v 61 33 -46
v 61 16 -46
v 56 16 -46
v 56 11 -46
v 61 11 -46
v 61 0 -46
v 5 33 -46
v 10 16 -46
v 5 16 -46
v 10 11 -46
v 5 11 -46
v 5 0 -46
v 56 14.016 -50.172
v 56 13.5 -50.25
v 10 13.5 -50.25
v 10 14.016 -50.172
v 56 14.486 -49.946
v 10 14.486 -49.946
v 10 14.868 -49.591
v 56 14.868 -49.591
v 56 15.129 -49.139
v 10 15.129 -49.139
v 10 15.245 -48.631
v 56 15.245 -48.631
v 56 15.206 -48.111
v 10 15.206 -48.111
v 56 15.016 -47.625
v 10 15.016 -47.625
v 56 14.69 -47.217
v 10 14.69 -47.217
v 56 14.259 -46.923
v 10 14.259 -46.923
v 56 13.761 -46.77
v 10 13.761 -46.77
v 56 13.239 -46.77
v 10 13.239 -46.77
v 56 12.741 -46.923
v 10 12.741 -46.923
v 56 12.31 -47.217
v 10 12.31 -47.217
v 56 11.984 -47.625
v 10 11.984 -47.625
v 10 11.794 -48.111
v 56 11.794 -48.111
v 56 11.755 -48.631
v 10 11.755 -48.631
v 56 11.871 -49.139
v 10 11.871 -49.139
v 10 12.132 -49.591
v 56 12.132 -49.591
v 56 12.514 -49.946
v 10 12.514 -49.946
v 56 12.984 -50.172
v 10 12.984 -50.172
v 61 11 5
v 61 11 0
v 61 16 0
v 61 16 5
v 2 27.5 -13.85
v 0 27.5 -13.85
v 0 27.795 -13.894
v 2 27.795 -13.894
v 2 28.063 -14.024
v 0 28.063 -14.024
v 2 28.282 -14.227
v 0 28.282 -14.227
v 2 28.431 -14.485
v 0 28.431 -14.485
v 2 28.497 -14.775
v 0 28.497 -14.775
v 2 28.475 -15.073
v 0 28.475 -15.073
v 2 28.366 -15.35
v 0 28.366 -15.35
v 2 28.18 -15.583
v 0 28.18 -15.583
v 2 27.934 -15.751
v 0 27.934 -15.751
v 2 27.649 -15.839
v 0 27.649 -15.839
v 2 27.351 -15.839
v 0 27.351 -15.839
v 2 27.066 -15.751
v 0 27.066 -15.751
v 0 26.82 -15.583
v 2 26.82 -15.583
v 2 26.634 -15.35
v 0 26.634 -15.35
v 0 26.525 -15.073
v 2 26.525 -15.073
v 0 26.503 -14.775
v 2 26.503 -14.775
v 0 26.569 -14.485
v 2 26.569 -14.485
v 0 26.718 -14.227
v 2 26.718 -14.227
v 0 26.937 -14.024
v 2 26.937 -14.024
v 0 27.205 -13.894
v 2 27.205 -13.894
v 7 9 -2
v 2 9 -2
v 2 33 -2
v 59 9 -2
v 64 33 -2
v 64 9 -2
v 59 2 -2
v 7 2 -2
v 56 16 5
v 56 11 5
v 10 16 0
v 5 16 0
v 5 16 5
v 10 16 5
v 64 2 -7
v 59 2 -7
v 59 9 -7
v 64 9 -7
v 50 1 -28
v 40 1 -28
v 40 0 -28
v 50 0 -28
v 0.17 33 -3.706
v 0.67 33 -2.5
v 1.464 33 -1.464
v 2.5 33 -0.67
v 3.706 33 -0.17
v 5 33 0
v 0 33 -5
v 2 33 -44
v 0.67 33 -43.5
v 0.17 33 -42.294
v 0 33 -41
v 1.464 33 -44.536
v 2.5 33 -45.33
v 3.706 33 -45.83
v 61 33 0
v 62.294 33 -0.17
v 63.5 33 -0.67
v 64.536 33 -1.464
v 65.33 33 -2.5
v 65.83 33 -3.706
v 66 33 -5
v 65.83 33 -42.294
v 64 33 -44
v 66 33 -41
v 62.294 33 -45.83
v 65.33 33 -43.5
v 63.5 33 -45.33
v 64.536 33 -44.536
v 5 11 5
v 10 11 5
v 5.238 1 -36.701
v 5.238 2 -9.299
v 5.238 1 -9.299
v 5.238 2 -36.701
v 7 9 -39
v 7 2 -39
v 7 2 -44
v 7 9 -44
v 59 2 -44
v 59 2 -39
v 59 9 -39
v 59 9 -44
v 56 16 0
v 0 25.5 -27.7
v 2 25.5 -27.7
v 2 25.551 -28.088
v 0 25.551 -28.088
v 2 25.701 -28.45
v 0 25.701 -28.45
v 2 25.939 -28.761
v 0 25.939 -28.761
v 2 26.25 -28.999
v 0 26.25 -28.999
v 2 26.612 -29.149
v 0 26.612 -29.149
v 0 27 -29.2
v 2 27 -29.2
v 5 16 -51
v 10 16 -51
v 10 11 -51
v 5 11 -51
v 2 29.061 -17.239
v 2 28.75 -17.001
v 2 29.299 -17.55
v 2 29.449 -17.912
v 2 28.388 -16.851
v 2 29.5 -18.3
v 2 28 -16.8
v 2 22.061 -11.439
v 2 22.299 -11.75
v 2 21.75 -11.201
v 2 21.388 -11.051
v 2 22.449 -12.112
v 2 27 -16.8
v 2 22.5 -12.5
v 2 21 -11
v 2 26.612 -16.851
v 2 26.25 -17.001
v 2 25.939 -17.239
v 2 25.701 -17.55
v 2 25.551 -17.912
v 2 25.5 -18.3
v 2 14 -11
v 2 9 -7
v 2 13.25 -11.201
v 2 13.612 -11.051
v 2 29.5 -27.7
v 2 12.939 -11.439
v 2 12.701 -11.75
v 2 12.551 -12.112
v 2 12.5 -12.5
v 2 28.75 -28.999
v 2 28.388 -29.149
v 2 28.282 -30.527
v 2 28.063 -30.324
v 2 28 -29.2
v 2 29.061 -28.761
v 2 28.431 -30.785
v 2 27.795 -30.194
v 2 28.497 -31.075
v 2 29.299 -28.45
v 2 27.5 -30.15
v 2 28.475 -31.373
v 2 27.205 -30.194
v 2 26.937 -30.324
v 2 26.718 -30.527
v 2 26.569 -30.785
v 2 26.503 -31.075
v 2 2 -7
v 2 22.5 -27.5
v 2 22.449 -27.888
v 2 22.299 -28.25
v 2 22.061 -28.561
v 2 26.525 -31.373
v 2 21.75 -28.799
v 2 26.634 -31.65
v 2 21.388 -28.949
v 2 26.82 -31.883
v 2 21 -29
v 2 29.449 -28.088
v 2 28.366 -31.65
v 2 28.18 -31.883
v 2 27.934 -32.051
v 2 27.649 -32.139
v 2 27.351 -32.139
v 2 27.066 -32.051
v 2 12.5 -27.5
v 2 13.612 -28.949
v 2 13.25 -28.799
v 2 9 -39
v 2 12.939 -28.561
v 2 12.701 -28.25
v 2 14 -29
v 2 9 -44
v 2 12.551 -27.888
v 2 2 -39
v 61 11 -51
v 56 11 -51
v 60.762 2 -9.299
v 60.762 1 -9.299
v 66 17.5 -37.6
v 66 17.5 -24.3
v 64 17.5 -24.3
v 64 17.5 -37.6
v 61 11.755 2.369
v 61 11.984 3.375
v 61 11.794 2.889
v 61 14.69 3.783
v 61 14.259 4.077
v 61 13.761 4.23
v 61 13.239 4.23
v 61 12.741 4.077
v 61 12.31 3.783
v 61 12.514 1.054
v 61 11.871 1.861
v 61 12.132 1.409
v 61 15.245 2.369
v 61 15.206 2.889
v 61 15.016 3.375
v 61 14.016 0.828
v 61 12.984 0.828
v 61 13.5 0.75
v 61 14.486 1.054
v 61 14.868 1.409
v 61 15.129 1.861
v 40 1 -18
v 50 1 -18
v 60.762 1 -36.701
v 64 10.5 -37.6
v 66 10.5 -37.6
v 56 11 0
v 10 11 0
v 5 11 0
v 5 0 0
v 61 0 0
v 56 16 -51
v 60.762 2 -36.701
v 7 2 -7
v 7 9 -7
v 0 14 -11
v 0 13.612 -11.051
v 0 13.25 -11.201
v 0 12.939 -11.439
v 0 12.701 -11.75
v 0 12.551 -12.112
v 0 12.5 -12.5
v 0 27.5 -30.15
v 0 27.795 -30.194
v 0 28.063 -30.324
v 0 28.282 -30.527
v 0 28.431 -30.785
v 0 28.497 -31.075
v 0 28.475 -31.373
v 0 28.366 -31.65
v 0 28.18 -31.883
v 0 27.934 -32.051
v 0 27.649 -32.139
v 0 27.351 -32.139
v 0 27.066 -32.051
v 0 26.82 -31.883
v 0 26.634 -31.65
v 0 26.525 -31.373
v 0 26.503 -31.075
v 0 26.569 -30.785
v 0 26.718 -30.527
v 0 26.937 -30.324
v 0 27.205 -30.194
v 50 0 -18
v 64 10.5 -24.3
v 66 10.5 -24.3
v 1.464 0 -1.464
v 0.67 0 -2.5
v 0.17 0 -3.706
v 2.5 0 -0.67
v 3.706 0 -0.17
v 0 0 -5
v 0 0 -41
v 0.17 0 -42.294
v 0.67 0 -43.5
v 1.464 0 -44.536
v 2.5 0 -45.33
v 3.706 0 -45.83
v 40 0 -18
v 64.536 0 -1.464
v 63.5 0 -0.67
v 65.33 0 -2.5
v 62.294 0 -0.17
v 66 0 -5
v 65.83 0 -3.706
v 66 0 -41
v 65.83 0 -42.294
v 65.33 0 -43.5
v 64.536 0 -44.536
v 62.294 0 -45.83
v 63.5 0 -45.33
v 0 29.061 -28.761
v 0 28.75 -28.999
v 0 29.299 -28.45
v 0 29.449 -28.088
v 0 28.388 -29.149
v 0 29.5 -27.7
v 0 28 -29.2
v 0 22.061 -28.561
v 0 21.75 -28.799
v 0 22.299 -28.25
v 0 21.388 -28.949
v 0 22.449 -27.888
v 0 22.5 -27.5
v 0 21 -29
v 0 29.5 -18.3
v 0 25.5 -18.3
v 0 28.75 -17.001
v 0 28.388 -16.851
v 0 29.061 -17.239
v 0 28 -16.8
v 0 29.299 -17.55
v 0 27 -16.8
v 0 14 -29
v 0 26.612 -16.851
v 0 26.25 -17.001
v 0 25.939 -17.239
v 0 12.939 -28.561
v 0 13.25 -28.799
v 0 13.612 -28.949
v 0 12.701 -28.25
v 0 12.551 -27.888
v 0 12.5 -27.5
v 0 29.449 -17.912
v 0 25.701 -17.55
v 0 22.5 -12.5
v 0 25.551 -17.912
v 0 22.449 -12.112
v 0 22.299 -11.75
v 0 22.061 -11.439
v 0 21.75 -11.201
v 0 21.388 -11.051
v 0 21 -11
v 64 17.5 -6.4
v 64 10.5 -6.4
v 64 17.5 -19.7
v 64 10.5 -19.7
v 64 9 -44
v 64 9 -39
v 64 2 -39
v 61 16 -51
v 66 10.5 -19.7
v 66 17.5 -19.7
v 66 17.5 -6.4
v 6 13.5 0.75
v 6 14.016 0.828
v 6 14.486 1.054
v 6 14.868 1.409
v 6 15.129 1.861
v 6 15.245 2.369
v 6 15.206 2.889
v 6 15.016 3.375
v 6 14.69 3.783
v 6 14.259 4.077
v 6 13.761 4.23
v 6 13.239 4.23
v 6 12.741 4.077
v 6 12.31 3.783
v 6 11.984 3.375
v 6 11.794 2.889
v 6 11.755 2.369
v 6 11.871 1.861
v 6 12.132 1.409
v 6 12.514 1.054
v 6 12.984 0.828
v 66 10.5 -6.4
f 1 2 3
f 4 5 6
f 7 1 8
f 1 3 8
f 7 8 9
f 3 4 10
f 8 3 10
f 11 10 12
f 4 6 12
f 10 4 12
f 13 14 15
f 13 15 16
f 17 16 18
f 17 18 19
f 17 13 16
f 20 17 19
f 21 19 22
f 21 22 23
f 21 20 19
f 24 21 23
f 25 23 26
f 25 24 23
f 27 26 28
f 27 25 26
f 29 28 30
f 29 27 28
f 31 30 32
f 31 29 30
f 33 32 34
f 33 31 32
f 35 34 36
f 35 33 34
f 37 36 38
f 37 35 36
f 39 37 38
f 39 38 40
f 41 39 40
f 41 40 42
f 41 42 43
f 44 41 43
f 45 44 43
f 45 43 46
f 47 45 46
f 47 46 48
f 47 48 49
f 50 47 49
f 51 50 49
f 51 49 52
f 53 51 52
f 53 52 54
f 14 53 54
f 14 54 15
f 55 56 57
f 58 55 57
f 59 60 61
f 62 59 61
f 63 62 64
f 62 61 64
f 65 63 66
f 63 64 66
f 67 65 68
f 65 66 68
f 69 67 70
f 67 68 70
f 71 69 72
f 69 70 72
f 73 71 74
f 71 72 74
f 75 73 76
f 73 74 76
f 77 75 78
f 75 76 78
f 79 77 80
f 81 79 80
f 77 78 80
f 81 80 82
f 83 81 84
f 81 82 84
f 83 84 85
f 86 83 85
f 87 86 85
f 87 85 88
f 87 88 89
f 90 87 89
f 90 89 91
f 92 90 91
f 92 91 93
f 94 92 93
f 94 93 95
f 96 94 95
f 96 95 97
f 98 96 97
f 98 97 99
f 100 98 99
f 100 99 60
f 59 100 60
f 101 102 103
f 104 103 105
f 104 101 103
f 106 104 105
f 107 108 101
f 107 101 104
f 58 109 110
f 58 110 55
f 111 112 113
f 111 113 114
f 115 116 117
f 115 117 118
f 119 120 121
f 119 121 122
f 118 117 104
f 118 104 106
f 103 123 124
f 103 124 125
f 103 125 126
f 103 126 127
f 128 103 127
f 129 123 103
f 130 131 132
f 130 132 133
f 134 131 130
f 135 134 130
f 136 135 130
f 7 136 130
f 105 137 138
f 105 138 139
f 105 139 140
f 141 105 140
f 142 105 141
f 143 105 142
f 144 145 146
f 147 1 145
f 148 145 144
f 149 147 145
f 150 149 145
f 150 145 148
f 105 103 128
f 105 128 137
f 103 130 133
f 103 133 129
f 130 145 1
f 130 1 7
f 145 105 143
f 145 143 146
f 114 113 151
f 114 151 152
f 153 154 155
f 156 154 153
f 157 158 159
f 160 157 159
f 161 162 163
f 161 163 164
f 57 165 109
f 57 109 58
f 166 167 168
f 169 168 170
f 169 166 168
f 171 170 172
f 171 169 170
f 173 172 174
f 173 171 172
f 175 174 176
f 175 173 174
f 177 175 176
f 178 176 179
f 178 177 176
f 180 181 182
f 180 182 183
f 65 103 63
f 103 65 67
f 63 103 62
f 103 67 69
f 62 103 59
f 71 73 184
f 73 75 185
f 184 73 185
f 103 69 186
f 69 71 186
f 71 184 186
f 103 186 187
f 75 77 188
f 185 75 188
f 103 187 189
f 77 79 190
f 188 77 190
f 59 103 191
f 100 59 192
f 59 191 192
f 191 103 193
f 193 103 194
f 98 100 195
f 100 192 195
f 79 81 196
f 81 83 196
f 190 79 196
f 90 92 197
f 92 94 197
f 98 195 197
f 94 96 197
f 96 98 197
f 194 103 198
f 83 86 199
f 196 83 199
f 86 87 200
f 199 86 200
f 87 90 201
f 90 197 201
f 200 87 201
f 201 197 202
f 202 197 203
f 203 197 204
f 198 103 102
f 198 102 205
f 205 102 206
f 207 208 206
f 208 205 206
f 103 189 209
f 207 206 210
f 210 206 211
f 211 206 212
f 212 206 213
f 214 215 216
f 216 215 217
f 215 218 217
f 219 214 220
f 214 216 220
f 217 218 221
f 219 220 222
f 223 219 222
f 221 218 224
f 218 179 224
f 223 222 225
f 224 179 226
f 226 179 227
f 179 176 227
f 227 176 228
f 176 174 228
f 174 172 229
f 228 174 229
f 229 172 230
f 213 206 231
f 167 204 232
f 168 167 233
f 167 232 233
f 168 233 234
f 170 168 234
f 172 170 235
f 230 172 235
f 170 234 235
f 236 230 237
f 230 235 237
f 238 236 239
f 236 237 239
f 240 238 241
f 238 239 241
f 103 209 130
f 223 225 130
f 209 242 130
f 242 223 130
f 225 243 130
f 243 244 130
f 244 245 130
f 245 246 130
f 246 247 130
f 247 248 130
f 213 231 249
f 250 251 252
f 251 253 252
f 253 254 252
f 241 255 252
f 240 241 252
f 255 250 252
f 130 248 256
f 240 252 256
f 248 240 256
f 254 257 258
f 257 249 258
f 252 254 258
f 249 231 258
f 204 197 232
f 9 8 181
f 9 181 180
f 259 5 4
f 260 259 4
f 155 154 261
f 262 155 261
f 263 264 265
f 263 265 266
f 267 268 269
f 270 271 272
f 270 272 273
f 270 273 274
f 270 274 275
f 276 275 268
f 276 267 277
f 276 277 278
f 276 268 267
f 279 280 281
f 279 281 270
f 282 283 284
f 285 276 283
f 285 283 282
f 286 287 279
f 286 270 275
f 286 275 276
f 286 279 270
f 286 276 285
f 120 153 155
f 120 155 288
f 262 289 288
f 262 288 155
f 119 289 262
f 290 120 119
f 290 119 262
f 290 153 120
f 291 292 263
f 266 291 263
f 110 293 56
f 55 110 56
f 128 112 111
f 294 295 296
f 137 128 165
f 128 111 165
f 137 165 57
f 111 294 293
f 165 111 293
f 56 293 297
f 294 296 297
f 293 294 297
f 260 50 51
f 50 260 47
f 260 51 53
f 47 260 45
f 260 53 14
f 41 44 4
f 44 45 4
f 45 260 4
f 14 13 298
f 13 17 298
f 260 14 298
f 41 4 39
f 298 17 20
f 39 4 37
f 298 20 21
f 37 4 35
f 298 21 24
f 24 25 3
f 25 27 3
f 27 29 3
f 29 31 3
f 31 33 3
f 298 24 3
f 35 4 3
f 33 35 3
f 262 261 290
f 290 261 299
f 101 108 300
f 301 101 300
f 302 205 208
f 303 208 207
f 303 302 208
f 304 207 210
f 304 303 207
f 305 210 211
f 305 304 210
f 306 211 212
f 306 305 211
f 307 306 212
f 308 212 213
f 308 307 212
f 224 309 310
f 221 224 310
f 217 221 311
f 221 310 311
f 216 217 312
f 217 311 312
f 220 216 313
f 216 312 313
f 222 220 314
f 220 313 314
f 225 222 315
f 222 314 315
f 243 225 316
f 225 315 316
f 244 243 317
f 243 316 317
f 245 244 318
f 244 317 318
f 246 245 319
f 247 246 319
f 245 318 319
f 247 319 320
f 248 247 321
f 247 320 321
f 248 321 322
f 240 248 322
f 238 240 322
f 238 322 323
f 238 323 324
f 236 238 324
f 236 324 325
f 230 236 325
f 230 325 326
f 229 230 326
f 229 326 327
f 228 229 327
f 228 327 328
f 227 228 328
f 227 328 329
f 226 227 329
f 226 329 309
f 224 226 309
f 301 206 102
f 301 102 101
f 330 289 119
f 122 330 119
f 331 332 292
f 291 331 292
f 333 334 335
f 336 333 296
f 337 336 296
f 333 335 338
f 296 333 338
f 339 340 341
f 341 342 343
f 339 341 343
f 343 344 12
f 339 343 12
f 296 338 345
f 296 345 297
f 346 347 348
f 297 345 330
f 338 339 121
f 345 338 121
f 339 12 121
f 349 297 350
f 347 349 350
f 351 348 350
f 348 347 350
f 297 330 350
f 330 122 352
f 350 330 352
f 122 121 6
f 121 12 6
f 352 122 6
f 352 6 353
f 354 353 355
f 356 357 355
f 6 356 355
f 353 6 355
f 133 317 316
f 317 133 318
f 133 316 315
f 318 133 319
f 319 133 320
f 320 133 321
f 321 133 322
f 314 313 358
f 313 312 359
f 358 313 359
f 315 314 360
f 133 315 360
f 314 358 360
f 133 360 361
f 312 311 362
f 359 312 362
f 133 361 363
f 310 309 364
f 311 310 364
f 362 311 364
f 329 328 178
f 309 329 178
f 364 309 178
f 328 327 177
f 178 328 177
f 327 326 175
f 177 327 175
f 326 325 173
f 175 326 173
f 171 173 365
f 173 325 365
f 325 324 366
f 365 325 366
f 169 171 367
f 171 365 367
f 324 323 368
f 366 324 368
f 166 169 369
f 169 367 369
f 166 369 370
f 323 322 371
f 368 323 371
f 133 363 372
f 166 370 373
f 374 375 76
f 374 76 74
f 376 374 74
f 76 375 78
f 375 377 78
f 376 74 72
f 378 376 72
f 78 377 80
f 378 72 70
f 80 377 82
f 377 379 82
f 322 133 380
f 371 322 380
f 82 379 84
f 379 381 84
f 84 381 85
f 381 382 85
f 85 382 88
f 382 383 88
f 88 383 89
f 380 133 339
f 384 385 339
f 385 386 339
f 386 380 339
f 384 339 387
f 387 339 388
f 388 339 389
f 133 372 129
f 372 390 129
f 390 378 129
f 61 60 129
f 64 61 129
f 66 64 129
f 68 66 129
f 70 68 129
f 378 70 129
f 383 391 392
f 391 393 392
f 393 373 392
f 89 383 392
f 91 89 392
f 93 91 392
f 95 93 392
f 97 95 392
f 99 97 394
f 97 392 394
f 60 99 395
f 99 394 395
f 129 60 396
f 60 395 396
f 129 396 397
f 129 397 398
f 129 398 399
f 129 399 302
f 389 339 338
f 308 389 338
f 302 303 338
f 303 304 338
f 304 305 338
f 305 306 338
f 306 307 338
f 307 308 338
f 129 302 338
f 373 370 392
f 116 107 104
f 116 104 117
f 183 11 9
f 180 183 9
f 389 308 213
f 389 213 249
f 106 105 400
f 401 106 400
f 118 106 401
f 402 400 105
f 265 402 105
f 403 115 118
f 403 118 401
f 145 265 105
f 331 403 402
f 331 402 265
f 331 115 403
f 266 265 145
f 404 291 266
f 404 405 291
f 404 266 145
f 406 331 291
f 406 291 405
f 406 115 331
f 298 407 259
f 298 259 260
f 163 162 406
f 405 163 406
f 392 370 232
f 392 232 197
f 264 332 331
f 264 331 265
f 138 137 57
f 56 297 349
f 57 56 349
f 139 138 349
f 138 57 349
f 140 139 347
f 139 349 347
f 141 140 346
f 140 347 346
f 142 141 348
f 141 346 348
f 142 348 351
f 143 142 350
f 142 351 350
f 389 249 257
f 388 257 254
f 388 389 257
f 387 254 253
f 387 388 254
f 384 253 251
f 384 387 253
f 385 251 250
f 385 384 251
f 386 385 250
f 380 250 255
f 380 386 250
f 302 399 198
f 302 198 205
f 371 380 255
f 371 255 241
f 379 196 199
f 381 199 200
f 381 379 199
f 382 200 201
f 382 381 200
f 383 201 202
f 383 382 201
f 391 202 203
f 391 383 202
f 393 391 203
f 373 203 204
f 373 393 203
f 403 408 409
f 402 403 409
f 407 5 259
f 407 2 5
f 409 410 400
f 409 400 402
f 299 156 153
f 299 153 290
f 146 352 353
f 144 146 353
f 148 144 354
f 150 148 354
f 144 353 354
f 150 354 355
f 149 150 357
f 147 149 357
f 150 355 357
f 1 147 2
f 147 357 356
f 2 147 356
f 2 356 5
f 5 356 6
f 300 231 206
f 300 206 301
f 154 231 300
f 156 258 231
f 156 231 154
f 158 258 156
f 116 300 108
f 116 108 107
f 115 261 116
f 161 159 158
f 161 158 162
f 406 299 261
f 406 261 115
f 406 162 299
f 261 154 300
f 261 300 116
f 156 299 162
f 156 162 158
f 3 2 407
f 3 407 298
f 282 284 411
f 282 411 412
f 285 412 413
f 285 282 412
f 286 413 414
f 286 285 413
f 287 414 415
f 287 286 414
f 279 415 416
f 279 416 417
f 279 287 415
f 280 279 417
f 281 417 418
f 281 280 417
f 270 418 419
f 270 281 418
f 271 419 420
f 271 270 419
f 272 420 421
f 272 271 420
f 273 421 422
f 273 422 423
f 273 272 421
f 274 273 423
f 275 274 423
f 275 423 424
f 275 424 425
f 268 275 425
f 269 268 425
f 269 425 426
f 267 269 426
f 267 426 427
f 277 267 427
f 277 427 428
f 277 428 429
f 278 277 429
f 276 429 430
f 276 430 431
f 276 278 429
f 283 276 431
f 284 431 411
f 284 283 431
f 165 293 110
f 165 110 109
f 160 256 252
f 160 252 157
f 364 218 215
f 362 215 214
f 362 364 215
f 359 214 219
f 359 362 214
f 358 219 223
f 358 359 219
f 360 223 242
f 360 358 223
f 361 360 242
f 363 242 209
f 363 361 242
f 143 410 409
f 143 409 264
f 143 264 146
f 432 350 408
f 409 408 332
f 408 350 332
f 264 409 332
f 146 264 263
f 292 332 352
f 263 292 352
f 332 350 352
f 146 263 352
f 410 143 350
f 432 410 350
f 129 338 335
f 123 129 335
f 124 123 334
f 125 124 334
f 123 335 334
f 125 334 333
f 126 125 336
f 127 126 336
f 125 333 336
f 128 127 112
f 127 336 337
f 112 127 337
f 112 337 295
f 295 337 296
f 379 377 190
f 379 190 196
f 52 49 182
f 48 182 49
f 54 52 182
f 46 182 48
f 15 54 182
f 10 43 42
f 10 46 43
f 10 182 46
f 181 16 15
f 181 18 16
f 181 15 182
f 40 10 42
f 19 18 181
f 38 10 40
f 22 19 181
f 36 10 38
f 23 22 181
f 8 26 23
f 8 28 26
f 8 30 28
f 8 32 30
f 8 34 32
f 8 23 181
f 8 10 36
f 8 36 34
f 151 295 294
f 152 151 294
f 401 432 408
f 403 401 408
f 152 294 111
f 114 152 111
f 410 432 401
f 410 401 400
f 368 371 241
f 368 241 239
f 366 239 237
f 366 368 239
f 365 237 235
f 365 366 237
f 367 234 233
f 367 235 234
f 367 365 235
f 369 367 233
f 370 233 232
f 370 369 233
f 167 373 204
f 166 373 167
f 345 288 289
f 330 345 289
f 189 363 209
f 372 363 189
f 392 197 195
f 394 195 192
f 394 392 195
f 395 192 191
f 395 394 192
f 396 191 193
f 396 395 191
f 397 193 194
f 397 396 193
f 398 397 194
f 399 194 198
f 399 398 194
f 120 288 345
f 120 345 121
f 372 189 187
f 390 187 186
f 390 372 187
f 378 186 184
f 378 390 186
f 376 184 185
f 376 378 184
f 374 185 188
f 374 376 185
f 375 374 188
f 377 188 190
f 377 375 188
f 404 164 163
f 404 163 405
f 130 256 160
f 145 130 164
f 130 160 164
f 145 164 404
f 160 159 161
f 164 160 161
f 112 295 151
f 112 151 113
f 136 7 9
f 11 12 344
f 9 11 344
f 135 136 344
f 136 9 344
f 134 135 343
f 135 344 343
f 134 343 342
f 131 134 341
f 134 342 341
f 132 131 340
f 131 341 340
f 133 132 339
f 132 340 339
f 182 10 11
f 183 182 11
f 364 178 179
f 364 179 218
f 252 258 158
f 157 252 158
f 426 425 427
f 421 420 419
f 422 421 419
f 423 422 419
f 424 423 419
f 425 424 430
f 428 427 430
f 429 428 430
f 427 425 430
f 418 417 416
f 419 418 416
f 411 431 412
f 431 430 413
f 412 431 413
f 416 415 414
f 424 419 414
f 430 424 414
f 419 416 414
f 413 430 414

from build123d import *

# Parameters (mm, degrees)
BOSS_EXTRUDE4_DEPTH  = 33
SKETCH1_4_W          = 62
SKETCH1_4_H          = 42
BOSS_EXTRUDE6_DEPTH  = 2
SKETCH1_7_W          = 5
SKETCH1_7_H          = 5
BOSS_EXTRUDE7_DEPTH  = 9
SKETCH5_W            = 10
SKETCH5_H            = 10
CUT_EXTRUDE1_DEPTH   = 87.214847909
SKETCH7_W            = 13.3
SKETCH7_H            = 7
CUT_EXTRUDE3_DEPTH   = 10
SKETCH8_W            = 5
SKETCH8_H            = 5
BOSS_EXTRUDE11_DEPTH = 5
SKETCH9_R            = 1.75
BOSS_EXTRUDE13_DEPTH = 55
SKETCH11_W           = 5
SKETCH11_H           = 5
BOSS_EXTRUDE14_DEPTH = 5
SKETCH12_R           = 1.75
BOSS_EXTRUDE16_DEPTH = 55
CUT_EXTRUDE10_DEPTH  = 10
SKETCH13_4_R         = 1
CUT_EXTRUDE11_DEPTH  = 10
CUT_EXTRUDE12_DEPTH  = 10
SKETCH14_W           = 55.52394705
SKETCH14_H           = 27.402982488
CUT_EXTRUDE13_DEPTH  = 1


with BuildPart() as part:
    # Sketch1 → Boss-Extrude4 (new body)
    with BuildSketch(Plane(origin=(0, 0, 0), x_dir=(1, 0, 0), z_dir=(0, 1, 0))):
        with BuildLine():
            ThreePointArc((0, 5), (1.464466094, 1.464466094), (5, 0))
            Line((5, 0), (61, 0))
            ThreePointArc((61, 0), (64.535533906, 1.464466094), (66, 5))
            Line((66, 5), (66, 41))
            ThreePointArc((66, 41), (64.535533906, 44.535533906), (61, 46))
            Line((61, 46), (5, 46))
            ThreePointArc((5, 46), (1.464466094, 44.535533906), (0, 41))
            Line((0, 41), (0, 5))
        make_face()
        Polygon((64, 44), (64, 39), (64, 7), (64, 2), (59, 2), (7, 2), (2, 2), (2, 7), (2, 39), (2, 44), (7, 44), (59, 44), align=None, mode=Mode.SUBTRACT)
    extrude(amount=BOSS_EXTRUDE4_DEPTH)

    # Sketch1<4> → Boss-Extrude6 (add)
    with BuildSketch(Plane(origin=(0, 0, 0), x_dir=(1, 0, 0), z_dir=(0, 1, 0))):
        with Locations((33, 23)):
            Rectangle(SKETCH1_4_W, SKETCH1_4_H)
    extrude(amount=BOSS_EXTRUDE6_DEPTH)

    # Sketch1<7> → Boss-Extrude7 (add)
    with BuildSketch(Plane(origin=(0, 0, 0), x_dir=(1, 0, 0), z_dir=(0, 1, 0))):
        with Locations((61.5, 41.5)):
            Rectangle(SKETCH1_7_W, SKETCH1_7_H)
        with Locations((61.5, 4.5)):
            Rectangle(SKETCH1_7_W, SKETCH1_7_H)
        with Locations((4.5, 41.5)):
            Rectangle(SKETCH1_7_W, SKETCH1_7_H)
        with Locations((4.5, 4.5)):
            Rectangle(SKETCH1_7_W, SKETCH1_7_H)
    extrude(amount=BOSS_EXTRUDE7_DEPTH)

    # Sketch5 → Cut-Extrude1 (cut, through all)
    with BuildSketch(Plane(origin=(0, 2, 0), x_dir=(1, 0, 0), z_dir=(0, 1, 0))):
        with Locations((45, 23)):
            Rectangle(SKETCH5_W, SKETCH5_H)
    extrude(amount=-CUT_EXTRUDE1_DEPTH, mode=Mode.SUBTRACT)

    # Sketch7 → Cut-Extrude3 (cut)
    with BuildSketch(Plane(origin=(66, 0, 0), x_dir=(0, 0, -1), z_dir=(1, 0, 0))):
        with Locations((13.05, 14)):
            Rectangle(SKETCH7_W, SKETCH7_H)
        with Locations((30.95, 14)):
            Rectangle(SKETCH7_W, SKETCH7_H)
    extrude(amount=-CUT_EXTRUDE3_DEPTH, mode=Mode.SUBTRACT)

    # Sketch8 → Boss-Extrude11 (add)
    with BuildSketch(Plane.XY):
        with Locations((58.5, 13.5)):
            Rectangle(SKETCH8_W, SKETCH8_H)
        with Locations((7.5, 13.5)):
            Rectangle(SKETCH8_W, SKETCH8_H)
    extrude(amount=BOSS_EXTRUDE11_DEPTH)

    # Sketch11 → Boss-Extrude14 (add)
    with BuildSketch(Plane(origin=(0, 0, -46), x_dir=(-1, 0, 0), z_dir=(0, 0, -1))):
        with Locations((-7.5, 13.5)):
            Rectangle(SKETCH11_W, SKETCH11_H)
        with Locations((-58.5, 13.5)):
            Rectangle(SKETCH11_W, SKETCH11_H)
    extrude(amount=BOSS_EXTRUDE14_DEPTH)

    # Sketch12 → Boss-Extrude16 (add)
    with BuildSketch(Plane(origin=(61, 0, 0), x_dir=(0, 0, -1), z_dir=(1, 0, 0))):
        with Locations((48.5, 13.5)):
            Circle(SKETCH12_R)
    extrude(amount=-BOSS_EXTRUDE16_DEPTH)

    # Sketch13 → Cut-Extrude10 (cut)
    with BuildSketch(Plane.ZY):
        with BuildLine():
            Line((-16.8, 27), (-16.8, 28))
            ThreePointArc((-16.8, 28), (-17.239339828, 29.060660172), (-18.3, 29.5))
            Line((-18.3, 29.5), (-27.7, 29.5))
            ThreePointArc((-27.7, 29.5), (-28.760660172, 29.060660172), (-29.2, 28))
            Line((-29.2, 28), (-29.2, 27))
            ThreePointArc((-29.2, 27), (-28.760660172, 25.939339828), (-27.7, 25.5))
            Line((-27.7, 25.5), (-18.3, 25.5))
            ThreePointArc((-18.3, 25.5), (-17.239339828, 25.939339828), (-16.8, 27))
        make_face()
    extrude(amount=-CUT_EXTRUDE10_DEPTH, mode=Mode.SUBTRACT)

    # Sketch13<4> → Cut-Extrude11 (cut)
    with BuildSketch(Plane.ZY):
        with Locations((-31.15, 27.5)):
            Circle(SKETCH13_4_R)
        with Locations((-14.85, 27.5)):
            Circle(SKETCH13_4_R)
    extrude(amount=-CUT_EXTRUDE11_DEPTH, mode=Mode.SUBTRACT)

    # Sketch13<5> → Cut-Extrude12 (cut)
    with BuildSketch(Plane.ZY):
        with BuildLine():
            Line((-27.5, 22.5), (-12.5, 22.5))
            ThreePointArc((-12.5, 22.5), (-11.439339828, 22.060660172), (-11, 21))
            Line((-11, 21), (-11, 14))
            ThreePointArc((-11, 14), (-11.439339828, 12.939339828), (-12.5, 12.5))
            Line((-12.5, 12.5), (-27.5, 12.5))
            ThreePointArc((-27.5, 12.5), (-28.560660172, 12.939339828), (-29, 14))
            Line((-29, 14), (-29, 21))
            ThreePointArc((-29, 21), (-28.560660172, 22.060660172), (-27.5, 22.5))
        make_face()
    extrude(amount=-CUT_EXTRUDE12_DEPTH, mode=Mode.SUBTRACT)

    # Sketch14 → Cut-Extrude13 (cut)
    with BuildSketch(Plane(origin=(0, 2, 0), x_dir=(1, 0, 0), z_dir=(0, 1, 0))):
        with Locations((33, 23)):
            Rectangle(SKETCH14_W, SKETCH14_H)
    extrude(amount=-CUT_EXTRUDE13_DEPTH, mode=Mode.SUBTRACT)


with BuildPart() as body_2:
    # Sketch9 → Boss-Extrude13 (new body)
    with BuildSketch(Plane(origin=(61, 0, 0), x_dir=(0, 0, -1), z_dir=(1, 0, 0))):
        with Locations((-2.5, 13.5)):
            Circle(SKETCH9_R)
    extrude(amount=-BOSS_EXTRUDE13_DEPTH)


solid = Compound([part.part, body_2.part])
